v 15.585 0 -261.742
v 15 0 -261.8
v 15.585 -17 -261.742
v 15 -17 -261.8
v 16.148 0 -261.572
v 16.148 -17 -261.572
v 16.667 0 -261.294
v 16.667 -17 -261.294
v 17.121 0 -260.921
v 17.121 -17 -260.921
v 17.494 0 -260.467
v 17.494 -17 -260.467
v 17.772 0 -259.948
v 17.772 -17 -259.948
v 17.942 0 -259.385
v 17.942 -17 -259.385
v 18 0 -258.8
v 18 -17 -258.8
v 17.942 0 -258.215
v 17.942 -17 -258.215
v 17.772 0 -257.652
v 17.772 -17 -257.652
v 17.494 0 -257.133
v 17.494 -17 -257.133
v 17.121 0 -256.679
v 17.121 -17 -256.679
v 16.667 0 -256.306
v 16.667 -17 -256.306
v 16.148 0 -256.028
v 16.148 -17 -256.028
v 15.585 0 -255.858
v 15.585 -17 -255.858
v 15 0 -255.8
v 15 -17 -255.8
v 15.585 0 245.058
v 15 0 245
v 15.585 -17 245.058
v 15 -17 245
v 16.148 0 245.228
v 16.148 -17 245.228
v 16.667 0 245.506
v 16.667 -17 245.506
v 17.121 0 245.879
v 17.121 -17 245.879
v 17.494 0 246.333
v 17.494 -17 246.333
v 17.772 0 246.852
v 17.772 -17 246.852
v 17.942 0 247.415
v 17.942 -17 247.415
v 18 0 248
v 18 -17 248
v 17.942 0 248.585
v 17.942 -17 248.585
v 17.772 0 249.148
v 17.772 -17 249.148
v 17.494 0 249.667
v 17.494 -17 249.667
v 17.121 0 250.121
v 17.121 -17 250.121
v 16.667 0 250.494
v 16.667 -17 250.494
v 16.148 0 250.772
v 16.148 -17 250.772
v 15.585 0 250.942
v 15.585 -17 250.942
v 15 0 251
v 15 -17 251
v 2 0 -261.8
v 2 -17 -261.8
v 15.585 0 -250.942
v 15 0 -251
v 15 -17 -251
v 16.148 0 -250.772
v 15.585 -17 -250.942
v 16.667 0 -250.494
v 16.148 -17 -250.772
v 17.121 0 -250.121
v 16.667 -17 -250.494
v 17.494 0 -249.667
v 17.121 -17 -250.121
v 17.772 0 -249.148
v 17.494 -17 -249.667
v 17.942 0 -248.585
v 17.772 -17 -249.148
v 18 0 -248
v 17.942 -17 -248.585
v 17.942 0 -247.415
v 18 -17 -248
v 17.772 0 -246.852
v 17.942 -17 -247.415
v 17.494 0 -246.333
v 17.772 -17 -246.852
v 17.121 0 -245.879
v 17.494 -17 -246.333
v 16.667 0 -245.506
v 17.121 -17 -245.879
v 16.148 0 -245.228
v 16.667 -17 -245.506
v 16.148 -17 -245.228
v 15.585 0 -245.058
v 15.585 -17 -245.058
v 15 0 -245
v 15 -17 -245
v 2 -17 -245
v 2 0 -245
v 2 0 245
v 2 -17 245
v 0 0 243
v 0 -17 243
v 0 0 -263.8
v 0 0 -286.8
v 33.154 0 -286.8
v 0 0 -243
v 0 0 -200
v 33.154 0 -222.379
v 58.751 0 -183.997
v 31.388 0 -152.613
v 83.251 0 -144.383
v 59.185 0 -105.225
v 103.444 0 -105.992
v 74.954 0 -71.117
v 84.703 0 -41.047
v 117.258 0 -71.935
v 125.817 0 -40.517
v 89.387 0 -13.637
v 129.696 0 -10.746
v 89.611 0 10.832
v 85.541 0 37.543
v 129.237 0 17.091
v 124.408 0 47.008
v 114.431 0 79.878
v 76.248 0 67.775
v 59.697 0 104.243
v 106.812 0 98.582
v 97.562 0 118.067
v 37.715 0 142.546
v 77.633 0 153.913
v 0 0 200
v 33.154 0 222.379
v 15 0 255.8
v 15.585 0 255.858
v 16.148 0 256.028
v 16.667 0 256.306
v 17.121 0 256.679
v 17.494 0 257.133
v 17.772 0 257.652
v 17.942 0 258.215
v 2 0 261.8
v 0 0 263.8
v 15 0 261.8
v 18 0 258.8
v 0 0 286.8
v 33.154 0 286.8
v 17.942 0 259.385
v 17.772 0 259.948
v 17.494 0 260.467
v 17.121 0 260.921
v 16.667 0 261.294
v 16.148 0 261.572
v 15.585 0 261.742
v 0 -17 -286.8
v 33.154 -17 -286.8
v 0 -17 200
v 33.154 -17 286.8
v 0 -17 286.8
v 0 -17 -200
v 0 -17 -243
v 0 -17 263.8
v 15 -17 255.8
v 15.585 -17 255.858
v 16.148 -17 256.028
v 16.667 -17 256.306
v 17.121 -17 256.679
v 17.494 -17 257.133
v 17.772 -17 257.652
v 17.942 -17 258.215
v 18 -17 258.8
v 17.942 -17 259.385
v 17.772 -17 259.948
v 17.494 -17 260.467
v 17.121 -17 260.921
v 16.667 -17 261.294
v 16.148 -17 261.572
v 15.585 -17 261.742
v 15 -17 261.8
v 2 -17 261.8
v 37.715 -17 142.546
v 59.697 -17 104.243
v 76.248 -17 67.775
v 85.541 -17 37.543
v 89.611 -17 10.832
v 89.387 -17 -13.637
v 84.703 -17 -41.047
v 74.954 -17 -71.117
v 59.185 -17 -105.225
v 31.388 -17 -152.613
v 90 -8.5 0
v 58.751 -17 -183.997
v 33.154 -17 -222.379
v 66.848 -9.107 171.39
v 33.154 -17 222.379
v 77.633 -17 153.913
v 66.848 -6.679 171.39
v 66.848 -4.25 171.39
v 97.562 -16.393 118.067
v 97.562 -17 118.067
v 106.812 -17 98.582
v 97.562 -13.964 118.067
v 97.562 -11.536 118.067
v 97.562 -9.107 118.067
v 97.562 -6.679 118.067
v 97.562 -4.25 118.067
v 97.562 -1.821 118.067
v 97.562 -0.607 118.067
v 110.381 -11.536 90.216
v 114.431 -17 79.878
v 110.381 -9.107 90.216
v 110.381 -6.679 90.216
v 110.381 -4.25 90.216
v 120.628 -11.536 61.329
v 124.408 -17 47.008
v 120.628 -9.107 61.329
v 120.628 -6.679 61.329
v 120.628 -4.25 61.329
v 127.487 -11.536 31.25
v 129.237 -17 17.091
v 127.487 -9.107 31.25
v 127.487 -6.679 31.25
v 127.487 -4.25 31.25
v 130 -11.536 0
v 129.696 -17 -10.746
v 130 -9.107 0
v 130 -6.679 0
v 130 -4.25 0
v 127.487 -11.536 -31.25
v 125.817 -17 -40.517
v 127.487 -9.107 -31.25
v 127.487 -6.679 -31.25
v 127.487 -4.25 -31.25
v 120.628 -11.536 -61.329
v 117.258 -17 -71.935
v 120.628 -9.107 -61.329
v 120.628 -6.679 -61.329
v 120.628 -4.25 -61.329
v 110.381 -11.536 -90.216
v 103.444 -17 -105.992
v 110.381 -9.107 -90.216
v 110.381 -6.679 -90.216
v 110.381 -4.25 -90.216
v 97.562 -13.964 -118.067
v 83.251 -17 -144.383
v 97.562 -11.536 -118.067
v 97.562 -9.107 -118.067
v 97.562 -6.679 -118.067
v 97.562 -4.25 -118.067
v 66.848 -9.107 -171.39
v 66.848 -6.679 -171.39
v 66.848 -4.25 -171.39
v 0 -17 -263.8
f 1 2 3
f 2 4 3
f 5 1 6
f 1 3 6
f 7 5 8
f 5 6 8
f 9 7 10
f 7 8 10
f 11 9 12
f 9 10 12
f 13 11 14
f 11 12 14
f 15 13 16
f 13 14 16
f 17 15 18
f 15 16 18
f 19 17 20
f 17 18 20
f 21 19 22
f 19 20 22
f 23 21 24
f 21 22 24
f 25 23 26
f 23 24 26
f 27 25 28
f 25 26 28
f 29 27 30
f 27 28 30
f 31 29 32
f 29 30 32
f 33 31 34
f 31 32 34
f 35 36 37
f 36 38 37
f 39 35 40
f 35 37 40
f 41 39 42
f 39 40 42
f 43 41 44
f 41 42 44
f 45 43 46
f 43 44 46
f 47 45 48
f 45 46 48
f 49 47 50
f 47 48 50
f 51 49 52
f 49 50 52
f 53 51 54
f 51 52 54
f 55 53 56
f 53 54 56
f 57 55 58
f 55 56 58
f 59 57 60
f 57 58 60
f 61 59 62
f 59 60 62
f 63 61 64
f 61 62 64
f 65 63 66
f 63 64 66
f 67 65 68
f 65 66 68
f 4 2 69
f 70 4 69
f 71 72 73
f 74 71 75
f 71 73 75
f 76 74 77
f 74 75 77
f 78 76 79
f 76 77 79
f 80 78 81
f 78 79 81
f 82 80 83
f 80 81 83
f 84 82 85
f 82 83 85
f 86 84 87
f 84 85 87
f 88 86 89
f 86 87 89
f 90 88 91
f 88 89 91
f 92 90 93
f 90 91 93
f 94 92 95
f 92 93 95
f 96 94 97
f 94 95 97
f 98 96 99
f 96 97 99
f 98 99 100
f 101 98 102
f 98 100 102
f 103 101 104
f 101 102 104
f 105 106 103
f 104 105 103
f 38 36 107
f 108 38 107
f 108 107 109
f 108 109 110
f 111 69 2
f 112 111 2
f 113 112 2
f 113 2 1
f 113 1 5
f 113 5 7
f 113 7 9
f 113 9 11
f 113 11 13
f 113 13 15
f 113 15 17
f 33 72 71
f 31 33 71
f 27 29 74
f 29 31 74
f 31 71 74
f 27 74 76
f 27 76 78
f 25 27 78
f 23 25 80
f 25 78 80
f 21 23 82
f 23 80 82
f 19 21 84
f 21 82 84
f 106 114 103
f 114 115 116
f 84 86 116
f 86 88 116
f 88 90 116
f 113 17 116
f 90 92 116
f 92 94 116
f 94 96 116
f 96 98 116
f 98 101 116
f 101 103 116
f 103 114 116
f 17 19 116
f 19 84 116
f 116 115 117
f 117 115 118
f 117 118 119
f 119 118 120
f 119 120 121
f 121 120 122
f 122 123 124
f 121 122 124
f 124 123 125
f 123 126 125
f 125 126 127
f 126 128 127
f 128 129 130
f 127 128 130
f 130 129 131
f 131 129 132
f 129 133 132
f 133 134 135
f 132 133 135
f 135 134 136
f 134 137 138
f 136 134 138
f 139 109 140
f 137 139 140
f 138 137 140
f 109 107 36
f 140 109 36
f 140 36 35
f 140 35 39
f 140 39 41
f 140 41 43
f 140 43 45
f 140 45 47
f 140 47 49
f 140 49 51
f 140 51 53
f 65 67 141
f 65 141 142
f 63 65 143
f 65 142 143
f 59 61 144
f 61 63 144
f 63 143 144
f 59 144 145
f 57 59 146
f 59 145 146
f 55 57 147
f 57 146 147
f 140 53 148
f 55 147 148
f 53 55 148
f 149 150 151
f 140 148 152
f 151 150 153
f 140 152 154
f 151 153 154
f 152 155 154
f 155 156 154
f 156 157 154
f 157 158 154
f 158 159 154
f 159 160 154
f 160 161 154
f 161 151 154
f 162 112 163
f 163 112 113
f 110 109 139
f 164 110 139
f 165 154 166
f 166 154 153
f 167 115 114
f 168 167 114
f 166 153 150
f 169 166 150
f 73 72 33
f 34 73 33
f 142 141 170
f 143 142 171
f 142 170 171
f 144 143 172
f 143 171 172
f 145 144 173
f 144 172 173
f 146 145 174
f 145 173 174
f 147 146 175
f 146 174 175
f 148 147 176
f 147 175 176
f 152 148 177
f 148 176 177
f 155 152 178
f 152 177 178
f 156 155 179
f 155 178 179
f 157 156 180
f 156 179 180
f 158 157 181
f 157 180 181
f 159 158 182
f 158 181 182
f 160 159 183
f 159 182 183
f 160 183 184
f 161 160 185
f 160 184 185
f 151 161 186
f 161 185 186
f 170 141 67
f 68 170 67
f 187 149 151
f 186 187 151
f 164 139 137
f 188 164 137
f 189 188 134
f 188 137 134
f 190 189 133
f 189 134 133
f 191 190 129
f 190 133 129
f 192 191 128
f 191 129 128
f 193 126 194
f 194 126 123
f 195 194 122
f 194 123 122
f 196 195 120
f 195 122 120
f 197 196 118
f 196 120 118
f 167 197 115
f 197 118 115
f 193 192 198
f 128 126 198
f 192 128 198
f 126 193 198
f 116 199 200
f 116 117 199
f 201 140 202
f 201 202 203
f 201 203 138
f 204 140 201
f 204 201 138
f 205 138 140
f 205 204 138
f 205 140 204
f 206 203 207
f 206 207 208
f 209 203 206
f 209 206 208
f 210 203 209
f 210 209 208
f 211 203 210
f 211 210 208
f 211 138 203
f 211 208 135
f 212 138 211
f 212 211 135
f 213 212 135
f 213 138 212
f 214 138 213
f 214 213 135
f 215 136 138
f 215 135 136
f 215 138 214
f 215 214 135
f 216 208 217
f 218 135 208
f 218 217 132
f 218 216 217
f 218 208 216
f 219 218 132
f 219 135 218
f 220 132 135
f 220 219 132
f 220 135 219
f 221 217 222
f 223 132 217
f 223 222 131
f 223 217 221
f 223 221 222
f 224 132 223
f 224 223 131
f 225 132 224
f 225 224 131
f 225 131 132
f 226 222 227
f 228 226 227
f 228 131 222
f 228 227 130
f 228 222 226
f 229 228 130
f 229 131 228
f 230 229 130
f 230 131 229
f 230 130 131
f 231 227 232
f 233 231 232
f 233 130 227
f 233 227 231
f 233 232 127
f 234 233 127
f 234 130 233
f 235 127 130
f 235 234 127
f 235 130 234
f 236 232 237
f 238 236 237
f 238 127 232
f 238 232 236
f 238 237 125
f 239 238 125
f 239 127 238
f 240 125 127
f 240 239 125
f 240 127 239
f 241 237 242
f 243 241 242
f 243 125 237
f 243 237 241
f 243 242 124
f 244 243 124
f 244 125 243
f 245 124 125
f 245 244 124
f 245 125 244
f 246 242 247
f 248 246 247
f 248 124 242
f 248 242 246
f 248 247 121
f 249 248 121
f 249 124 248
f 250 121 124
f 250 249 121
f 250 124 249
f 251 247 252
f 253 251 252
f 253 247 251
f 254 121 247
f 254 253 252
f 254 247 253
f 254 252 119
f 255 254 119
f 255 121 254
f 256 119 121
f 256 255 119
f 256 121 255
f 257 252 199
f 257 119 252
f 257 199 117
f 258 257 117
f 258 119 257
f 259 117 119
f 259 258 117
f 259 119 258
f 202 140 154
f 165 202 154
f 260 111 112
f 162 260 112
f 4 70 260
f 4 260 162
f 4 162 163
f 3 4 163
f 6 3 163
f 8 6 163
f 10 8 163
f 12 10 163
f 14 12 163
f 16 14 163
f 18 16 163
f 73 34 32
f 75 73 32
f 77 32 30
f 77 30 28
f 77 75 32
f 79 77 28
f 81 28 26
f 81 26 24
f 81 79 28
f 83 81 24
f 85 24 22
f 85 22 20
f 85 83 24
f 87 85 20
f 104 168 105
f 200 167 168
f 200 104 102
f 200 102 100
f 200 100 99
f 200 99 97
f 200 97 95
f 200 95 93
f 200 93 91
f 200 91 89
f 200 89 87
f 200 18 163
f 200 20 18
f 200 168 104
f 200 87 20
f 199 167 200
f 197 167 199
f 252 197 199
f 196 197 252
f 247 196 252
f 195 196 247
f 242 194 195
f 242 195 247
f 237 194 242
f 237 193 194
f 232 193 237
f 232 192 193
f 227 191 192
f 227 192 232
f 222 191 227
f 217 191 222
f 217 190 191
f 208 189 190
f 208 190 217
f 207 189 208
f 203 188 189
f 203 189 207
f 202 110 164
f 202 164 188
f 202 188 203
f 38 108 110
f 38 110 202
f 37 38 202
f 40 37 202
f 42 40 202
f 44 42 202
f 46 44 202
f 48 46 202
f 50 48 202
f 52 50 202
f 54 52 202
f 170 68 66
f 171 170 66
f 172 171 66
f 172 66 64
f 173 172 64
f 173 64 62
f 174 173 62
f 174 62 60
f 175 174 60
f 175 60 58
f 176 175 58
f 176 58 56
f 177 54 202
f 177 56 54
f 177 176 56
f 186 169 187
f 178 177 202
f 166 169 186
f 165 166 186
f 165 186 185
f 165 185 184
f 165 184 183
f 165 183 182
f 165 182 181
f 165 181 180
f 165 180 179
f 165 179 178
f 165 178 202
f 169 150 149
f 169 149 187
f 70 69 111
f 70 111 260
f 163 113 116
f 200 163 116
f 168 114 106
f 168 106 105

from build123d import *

# Parameters (mm, degrees)
F1_DEPTH = 17
F2_R     = 3
F3_DEPTH = 25
F4_SIZE  = 2


# Not quite as in the source:
# - the dataset's text gives a spline's control points without its knots; the knots are read off the source's solid


with BuildPart() as f1:
    # F0 (on Front) → F1 (new body)
    with BuildSketch(Plane.XZ):
        with BuildLine():
            Line((0, 245), (0, 200))
            add(Edge.make_bspline(
                [(0, 200), (45, 133.3333333333), (135, 0), (45, -133.3333333333), (0, -200)],
                knots=[0, 0, 0, 0, 0.5, 1, 1, 1, 1], degree=3))
            Line((0, -200), (0, -245))
            Line((0, -245), (15, -245))
            Line((15, -245), (15, -261.8))
            Line((15, -261.8), (0, -261.8))
            Line((0, -261.8), (0, -286.8))
            Line((0, -286.8), (33.153946963, -286.8))
            Line((33.153946963, -286.8), (33.153946963, -222.3789142))
            add(Edge.make_bspline(
                [(33.153946963, 222.3789142), (38.778946963, 214.0455808667), (50.1370946994, 197.2199375913), (66.9704607705, 171.4834064893), (83.0666221963, 145.1835388594), (97.8752152805, 118.2069155881), (108.6517536257, 95.0256105135), (115.9962383389, 75.9610643166), (120.768213582, 61.3791709128), (124.6977896579, 46.4952551717), (127.1729613057, 33.8331492243), (128.6105780855, 23.5524512191), (129.4012955844, 15.7700211508), (129.8071764378, 9.2278748435), (129.9720929215, 3.9649278514), (130.0139535392, 0), (129.9720929215, -3.9649278514), (129.8071764378, -9.2278748435), (129.4012955844, -15.7700211508), (128.6105780855, -23.5524512191), (127.1729613057, -33.8331492243), (124.6977896579, -46.4952551717), (120.768213582, -61.3791709128), (115.9962383389, -75.9610643166), (108.6517536257, -95.0256105135), (97.8752152805, -118.2069155881), (83.0666221963, -145.1835388594), (66.9704607705, -171.4834064893), (50.1370946994, -197.2199375913), (38.778946963, -214.0455808667), (33.153946963, -222.3789142)],
                knots=[0, 0, 0, 0, 0.0625, 0.125, 0.1875, 0.25, 0.3125, 0.34375, 0.375, 0.40625, 0.4375, 0.453125, 0.46875, 0.484375, 0.4921875, 0.5, 0.5078125, 0.515625, 0.53125, 0.546875, 0.5625, 0.59375, 0.625, 0.65625, 0.6875, 0.75, 0.8125, 0.875, 0.9375, 1, 1, 1, 1], degree=3))
            Line((33.153946963, 222.3789142), (33.153946963, 286.8))
            Line((33.153946963, 286.8), (0, 286.8))
            Line((0, 286.8), (0, 261.8))
            Line((0, 261.8), (15, 261.8))
            Line((15, 261.8), (15, 245))
            Line((15, 245), (0, 245))
        make_face()
    extrude(amount=F1_DEPTH)

    # F2 (on face) → F3 (cut)
    with BuildSketch(Plane.XZ.offset(17)):
        with Locations((15, 248)):
            Circle(F2_R)
        with Locations((15, 258.8)):
            Circle(F2_R)
        with Locations((15, -248)):
            Circle(F2_R)
        with Locations((15, -258.8)):
            Circle(F2_R)
    extrude(amount=-F3_DEPTH, mode=Mode.SUBTRACT)

    # F4
    f4_edges = [f1.edges().sort_by_distance(p)[0] for p in [
        (0, -8.5, 261.8),
        (0, -8.5, 245),
        (0, -8.5, -245),
        (0, -8.5, -261.8),
    ]]
    chamfer(f4_edges, length=F4_SIZE)


solid = f1.part
